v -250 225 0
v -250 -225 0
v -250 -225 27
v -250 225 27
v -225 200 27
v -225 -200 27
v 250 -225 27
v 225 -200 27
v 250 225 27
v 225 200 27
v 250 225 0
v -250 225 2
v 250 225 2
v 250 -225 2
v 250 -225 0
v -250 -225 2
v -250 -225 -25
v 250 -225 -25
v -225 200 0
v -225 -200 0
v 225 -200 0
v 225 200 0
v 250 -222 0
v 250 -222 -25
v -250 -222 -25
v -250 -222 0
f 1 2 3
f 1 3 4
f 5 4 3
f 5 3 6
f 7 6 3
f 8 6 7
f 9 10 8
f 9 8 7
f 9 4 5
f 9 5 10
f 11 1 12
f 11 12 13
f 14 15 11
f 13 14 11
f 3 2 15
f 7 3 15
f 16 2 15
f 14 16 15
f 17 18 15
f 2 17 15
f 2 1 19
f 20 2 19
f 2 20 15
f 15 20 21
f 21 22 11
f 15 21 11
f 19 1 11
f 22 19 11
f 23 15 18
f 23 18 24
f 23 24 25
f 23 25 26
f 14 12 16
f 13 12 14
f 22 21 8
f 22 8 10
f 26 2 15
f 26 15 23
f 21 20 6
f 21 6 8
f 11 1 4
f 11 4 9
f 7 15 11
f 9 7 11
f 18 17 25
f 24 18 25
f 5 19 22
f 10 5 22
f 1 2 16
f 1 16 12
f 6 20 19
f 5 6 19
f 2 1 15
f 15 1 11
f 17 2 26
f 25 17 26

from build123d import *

# Parameters (mm, degrees)
F0_W     = 500
F0_H     = 450
F0_W_2   = 449.999994
F0_H_2   = 399.999994
F1_DEPTH = 2
F2_DEPTH = 27
F3_W     = 3
F3_H     = 25
F4_DEPTH = 500


with BuildPart() as f1:
    # F0 (on Top) → F1 (new body)
    with BuildSketch(Plane.XY):
        Rectangle(F0_W, F0_H)
        Rectangle(F0_W_2, F0_H_2, mode=Mode.SUBTRACT)
        Rectangle(F0_W_2, F0_H_2)
    extrude(amount=F1_DEPTH)


with BuildPart() as f2:
    # F0 (on Top) → F2 (new body)
    with BuildSketch(Plane.XY):
        Rectangle(F0_W, F0_H)
        Rectangle(F0_W_2, F0_H_2, mode=Mode.SUBTRACT)
    extrude(amount=F2_DEPTH)


with BuildPart() as f4:
    # F3 (on face) → F4 (new body)
    with BuildSketch(Plane.YZ.offset(250)):
        with Locations((-223.5, -12.5)):
            Rectangle(F3_W, F3_H)
    extrude(amount=-F4_DEPTH)


solid = Compound([f1.part, f2.part, f4.part])
